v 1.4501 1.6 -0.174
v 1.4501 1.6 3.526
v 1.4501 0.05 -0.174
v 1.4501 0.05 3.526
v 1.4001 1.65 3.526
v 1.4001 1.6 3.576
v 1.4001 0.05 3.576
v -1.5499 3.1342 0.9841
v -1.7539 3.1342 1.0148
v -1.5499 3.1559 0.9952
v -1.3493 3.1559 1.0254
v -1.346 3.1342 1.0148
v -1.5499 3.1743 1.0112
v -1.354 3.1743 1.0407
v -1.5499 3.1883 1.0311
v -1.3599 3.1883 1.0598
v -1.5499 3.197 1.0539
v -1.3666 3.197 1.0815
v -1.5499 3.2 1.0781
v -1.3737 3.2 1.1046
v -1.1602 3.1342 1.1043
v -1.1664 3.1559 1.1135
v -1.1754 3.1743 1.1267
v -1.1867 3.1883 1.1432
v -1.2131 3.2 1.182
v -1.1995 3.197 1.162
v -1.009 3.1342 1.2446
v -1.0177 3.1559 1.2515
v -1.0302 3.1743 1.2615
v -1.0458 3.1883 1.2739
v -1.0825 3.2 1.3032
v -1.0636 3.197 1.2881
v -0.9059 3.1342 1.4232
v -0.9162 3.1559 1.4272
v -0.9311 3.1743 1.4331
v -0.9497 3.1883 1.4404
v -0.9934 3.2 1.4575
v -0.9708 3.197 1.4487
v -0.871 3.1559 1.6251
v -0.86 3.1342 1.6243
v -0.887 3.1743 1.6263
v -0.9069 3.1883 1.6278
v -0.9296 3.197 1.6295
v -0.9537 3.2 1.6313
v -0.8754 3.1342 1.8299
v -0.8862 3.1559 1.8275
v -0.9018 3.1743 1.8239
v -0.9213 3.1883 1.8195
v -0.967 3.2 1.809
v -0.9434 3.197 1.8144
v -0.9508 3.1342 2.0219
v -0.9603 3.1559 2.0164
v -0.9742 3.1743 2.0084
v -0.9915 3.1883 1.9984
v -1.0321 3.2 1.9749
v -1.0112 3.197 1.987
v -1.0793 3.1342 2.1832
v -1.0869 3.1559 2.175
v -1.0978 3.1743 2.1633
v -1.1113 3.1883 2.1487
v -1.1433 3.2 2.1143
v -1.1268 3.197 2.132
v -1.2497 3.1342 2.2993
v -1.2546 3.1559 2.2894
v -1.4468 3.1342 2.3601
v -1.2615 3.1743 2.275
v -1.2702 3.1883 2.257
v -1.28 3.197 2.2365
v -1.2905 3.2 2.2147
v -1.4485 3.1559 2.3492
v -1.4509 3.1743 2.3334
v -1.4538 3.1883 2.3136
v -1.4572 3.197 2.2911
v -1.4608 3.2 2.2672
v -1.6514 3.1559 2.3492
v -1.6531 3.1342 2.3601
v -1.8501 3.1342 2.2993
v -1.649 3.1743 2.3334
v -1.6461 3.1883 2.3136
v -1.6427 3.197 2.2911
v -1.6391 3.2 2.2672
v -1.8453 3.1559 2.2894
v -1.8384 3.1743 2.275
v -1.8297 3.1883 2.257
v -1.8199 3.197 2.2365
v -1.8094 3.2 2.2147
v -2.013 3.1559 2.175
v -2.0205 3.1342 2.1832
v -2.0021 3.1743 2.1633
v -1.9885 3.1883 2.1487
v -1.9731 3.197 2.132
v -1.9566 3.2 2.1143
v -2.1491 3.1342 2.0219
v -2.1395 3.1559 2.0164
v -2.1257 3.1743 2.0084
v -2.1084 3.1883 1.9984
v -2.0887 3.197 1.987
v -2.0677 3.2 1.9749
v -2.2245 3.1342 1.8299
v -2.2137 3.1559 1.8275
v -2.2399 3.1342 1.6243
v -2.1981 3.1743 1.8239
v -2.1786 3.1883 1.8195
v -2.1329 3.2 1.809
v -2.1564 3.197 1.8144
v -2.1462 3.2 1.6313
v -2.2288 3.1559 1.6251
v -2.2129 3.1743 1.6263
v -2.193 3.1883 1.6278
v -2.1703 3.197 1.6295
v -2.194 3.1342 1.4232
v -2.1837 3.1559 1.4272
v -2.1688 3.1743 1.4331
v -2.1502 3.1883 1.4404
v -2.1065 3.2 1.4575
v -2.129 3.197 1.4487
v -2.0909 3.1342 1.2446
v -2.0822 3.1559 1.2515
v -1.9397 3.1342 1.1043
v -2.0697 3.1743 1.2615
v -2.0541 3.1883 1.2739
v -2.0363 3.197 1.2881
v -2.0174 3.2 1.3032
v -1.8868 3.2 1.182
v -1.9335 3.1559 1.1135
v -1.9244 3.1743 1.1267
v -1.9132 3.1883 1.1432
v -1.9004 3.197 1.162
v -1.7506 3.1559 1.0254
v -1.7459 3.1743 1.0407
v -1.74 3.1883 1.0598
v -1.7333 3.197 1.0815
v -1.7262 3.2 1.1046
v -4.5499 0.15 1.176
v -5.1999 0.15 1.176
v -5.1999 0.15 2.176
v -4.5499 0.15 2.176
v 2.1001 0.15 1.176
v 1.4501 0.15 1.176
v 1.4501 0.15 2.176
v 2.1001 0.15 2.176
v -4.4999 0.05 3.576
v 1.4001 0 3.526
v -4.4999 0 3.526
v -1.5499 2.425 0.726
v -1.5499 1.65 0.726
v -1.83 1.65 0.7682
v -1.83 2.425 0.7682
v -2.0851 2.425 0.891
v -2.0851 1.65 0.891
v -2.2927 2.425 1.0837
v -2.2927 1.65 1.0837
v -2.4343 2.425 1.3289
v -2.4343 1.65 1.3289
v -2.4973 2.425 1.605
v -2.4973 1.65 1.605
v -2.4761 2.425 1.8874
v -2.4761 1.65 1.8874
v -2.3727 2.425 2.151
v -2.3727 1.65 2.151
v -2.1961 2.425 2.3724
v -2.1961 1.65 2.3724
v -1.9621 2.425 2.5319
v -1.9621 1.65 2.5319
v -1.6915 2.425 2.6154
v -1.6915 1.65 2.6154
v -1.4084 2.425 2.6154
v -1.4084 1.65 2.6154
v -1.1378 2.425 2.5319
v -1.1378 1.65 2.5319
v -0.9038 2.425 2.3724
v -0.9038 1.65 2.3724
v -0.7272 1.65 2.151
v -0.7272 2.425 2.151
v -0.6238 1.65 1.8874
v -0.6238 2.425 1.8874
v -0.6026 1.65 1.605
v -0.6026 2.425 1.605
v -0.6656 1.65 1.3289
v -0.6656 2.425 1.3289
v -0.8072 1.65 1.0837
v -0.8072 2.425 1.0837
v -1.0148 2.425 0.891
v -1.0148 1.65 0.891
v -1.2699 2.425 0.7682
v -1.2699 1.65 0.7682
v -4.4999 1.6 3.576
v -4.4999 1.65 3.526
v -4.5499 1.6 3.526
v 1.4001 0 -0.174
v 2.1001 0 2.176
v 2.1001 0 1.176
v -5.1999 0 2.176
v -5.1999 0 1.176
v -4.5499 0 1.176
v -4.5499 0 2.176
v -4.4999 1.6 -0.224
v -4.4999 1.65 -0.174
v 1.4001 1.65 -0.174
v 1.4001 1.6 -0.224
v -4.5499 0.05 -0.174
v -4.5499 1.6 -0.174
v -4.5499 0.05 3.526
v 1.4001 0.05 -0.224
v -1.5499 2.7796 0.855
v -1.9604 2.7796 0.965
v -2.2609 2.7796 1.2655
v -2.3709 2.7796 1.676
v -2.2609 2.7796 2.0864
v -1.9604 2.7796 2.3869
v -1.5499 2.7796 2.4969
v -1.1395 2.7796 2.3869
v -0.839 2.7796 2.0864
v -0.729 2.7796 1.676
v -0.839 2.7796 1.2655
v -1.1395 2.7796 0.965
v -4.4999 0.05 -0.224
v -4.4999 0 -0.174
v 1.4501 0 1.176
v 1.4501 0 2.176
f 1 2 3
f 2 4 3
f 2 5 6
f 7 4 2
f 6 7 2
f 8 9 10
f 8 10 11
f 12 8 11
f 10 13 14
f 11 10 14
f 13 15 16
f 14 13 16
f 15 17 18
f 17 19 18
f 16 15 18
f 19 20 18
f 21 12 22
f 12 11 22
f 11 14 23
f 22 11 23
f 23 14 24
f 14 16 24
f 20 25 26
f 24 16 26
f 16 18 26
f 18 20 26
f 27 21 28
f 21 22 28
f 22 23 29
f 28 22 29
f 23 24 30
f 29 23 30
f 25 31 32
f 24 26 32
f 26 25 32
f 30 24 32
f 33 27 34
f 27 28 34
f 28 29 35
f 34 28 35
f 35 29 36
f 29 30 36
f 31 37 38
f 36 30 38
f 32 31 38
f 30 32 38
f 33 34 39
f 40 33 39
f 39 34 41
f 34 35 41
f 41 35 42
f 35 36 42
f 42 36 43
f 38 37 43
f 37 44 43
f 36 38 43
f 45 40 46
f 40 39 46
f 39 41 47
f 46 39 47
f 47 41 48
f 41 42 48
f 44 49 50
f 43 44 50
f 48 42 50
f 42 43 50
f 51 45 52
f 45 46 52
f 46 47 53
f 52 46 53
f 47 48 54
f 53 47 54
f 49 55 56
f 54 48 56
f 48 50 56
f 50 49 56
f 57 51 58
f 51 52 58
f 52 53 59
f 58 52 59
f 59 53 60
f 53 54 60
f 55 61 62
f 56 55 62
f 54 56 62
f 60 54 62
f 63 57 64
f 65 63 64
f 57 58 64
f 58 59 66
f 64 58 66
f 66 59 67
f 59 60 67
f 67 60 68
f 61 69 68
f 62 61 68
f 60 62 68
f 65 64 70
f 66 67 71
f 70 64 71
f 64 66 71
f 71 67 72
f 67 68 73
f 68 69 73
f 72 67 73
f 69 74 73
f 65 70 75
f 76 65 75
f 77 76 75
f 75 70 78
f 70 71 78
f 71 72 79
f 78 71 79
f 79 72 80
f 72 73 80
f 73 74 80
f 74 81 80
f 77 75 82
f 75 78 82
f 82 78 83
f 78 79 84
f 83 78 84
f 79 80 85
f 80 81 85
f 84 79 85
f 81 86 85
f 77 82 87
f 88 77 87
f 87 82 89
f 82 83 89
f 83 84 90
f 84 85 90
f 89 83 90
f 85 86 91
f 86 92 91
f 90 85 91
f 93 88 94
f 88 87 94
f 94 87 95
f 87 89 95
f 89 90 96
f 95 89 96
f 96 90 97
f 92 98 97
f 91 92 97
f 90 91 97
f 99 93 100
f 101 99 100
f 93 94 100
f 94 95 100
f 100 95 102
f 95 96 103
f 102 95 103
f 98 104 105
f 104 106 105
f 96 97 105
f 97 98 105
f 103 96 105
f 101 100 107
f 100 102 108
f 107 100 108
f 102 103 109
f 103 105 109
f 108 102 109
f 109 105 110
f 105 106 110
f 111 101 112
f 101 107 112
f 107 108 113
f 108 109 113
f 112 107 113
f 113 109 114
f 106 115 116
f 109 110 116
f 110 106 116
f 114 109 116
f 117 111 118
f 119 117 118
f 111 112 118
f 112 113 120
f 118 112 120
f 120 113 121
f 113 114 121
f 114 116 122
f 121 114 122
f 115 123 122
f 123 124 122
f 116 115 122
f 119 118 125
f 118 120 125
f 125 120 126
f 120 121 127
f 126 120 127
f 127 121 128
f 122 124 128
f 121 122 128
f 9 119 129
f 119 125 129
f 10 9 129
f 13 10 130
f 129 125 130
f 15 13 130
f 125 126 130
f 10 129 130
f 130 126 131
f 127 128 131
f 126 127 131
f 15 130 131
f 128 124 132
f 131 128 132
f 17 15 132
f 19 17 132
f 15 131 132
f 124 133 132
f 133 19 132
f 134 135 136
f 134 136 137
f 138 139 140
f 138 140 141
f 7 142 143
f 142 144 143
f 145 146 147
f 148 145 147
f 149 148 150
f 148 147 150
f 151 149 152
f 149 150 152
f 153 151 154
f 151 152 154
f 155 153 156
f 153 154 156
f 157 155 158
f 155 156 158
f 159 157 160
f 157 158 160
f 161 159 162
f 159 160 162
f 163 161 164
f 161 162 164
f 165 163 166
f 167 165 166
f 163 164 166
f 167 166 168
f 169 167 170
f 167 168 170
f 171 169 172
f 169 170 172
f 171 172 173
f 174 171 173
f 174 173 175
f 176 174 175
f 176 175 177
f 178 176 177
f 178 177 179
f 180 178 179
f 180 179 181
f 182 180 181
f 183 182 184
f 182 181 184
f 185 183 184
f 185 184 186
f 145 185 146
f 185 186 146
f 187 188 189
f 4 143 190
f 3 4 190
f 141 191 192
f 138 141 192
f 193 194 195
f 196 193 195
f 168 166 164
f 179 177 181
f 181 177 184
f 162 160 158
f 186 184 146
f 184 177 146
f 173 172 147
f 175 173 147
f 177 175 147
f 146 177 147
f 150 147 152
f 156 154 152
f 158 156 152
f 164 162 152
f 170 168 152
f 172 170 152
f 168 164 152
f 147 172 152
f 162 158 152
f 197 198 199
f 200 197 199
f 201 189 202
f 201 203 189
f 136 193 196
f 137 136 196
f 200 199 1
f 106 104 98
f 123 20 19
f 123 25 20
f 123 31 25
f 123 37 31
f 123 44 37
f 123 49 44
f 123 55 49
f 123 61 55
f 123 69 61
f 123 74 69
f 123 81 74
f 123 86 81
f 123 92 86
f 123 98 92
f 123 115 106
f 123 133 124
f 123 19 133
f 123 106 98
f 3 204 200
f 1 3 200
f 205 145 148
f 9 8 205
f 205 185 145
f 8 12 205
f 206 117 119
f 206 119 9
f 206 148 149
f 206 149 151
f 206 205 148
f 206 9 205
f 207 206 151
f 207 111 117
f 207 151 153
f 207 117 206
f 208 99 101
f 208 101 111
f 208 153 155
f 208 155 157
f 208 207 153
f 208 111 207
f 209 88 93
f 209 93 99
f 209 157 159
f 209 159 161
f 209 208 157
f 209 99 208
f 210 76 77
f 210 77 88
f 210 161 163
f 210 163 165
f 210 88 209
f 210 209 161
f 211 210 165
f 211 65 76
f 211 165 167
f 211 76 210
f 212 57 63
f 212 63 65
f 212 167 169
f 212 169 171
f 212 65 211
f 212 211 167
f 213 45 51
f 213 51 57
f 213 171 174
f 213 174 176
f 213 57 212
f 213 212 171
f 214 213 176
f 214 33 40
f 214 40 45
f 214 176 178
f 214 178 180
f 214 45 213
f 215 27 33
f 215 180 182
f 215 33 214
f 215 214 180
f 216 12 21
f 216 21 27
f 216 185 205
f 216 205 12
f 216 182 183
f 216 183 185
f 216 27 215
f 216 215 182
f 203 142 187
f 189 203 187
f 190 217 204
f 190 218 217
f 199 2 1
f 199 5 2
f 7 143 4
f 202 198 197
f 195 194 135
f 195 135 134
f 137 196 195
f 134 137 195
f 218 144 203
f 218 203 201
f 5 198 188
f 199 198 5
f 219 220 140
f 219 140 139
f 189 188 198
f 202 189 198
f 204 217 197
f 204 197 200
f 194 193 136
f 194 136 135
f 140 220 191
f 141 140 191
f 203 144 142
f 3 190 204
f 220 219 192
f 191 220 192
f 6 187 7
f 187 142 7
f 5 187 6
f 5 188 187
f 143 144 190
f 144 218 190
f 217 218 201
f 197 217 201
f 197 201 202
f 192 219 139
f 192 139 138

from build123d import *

# Parameters (mm, degrees)
SKETCH1_W             = 6
SKETCH1_H             = 3.8
BOSS_EXTRUDE1_DEPTH   = 1.65
SKETCH1_3_W           = 0.65
SKETCH1_3_H           = 1
BOSS_EXTRUDE2_DEPTH   = 0.15
BOSS_EXTRUDE2_2_DEPTH = 0.15
SKETCH2_R             = 0.95
BOSS_EXTRUDE3_DEPTH   = 0.775
SKETCH4_R             = 0.95
BOSS_EXTRUDE4_DEPTH   = 0.775
BOSS_EXTRUDE4_TAPER   = 20
FILLET1_R             = 0.1
CHAMFER1_SIZE         = 0.05


with BuildPart() as part:
    # Sketch1 → Boss-Extrude1 (new body)
    with BuildSketch(Plane(origin=(0, 0, 0), x_dir=(1, 0, 0), z_dir=(0, 1, 0))):
        with Locations((-1.549940831, -1.675974026)):
            Rectangle(SKETCH1_W, SKETCH1_H)
    extrude(amount=BOSS_EXTRUDE1_DEPTH)

    # Chamfer1
    chamfer1_edges = [part.edges().sort_by_distance(p)[0] for p in [
        (1.450059169, 0, 1.675974026),
        (-4.549940831, 0, 1.675974026),
        (1.450059169, 0.825, -0.224025974),
        (-1.549940831, 0, -0.224025974),
        (-4.549940831, 0.825, -0.224025974),
        (-4.549940831, 0.825, 3.575974026),
        (-1.549940831, 0, 3.575974026),
        (1.450059169, 0.825, 3.575974026),
        (-1.549940831, 1.65, -0.224025974),
        (1.450059169, 1.65, 1.675974026),
        (-1.549940831, 1.65, 3.575974026),
        (-4.549940831, 1.65, 1.675974026),
    ]]
    chamfer(chamfer1_edges, length=CHAMFER1_SIZE)


with BuildPart() as body_2:
    # Sketch1<3> → Boss-Extrude2 (new body)
    with BuildSketch(Plane(origin=(0, 0, 0), x_dir=(1, 0, 0), z_dir=(0, 1, 0))):
        with Locations((1.775059169, -1.675974026)):
            Rectangle(SKETCH1_3_W, SKETCH1_3_H)
    extrude(amount=BOSS_EXTRUDE2_DEPTH)


with BuildPart() as body_3:
    # Sketch1<3> → Boss-Extrude2 2 (new body)
    with BuildSketch(Plane(origin=(0, 0, 0), x_dir=(1, 0, 0), z_dir=(0, 1, 0))):
        with Locations((-4.874940831, -1.675974026)):
            Rectangle(SKETCH1_3_W, SKETCH1_3_H)
    extrude(amount=BOSS_EXTRUDE2_2_DEPTH)


with BuildPart() as body_4:
    # Sketch2 → Boss-Extrude3 (new body)
    with BuildSketch(Plane(origin=(0, 1.65, 0), x_dir=(1, 0, 0), z_dir=(0, 1, 0))):
        with Locations((-1.549940831, -1.675974026)):
            Circle(SKETCH2_R)
    extrude(amount=BOSS_EXTRUDE3_DEPTH)

    # Sketch4 → Boss-Extrude4 (add)
    with BuildSketch(Plane(origin=(0, 2.425, 0), x_dir=(1, 0, 0), z_dir=(0, 1, 0))):
        with Locations((-1.549940831, -1.675974026)):
            Circle(SKETCH4_R)
    extrude(amount=BOSS_EXTRUDE4_DEPTH, taper=BOSS_EXTRUDE4_TAPER)

    # Fillet1
    fillet1_edges = [body_4.edges().sort_by_distance(p)[0] for p in [
        (-2.2178639, 3.2, 1.675974026),
    ]]
    fillet(fillet1_edges, radius=FILLET1_R)


solid = Compound([part.part, body_2.part, body_3.part, body_4.part])
